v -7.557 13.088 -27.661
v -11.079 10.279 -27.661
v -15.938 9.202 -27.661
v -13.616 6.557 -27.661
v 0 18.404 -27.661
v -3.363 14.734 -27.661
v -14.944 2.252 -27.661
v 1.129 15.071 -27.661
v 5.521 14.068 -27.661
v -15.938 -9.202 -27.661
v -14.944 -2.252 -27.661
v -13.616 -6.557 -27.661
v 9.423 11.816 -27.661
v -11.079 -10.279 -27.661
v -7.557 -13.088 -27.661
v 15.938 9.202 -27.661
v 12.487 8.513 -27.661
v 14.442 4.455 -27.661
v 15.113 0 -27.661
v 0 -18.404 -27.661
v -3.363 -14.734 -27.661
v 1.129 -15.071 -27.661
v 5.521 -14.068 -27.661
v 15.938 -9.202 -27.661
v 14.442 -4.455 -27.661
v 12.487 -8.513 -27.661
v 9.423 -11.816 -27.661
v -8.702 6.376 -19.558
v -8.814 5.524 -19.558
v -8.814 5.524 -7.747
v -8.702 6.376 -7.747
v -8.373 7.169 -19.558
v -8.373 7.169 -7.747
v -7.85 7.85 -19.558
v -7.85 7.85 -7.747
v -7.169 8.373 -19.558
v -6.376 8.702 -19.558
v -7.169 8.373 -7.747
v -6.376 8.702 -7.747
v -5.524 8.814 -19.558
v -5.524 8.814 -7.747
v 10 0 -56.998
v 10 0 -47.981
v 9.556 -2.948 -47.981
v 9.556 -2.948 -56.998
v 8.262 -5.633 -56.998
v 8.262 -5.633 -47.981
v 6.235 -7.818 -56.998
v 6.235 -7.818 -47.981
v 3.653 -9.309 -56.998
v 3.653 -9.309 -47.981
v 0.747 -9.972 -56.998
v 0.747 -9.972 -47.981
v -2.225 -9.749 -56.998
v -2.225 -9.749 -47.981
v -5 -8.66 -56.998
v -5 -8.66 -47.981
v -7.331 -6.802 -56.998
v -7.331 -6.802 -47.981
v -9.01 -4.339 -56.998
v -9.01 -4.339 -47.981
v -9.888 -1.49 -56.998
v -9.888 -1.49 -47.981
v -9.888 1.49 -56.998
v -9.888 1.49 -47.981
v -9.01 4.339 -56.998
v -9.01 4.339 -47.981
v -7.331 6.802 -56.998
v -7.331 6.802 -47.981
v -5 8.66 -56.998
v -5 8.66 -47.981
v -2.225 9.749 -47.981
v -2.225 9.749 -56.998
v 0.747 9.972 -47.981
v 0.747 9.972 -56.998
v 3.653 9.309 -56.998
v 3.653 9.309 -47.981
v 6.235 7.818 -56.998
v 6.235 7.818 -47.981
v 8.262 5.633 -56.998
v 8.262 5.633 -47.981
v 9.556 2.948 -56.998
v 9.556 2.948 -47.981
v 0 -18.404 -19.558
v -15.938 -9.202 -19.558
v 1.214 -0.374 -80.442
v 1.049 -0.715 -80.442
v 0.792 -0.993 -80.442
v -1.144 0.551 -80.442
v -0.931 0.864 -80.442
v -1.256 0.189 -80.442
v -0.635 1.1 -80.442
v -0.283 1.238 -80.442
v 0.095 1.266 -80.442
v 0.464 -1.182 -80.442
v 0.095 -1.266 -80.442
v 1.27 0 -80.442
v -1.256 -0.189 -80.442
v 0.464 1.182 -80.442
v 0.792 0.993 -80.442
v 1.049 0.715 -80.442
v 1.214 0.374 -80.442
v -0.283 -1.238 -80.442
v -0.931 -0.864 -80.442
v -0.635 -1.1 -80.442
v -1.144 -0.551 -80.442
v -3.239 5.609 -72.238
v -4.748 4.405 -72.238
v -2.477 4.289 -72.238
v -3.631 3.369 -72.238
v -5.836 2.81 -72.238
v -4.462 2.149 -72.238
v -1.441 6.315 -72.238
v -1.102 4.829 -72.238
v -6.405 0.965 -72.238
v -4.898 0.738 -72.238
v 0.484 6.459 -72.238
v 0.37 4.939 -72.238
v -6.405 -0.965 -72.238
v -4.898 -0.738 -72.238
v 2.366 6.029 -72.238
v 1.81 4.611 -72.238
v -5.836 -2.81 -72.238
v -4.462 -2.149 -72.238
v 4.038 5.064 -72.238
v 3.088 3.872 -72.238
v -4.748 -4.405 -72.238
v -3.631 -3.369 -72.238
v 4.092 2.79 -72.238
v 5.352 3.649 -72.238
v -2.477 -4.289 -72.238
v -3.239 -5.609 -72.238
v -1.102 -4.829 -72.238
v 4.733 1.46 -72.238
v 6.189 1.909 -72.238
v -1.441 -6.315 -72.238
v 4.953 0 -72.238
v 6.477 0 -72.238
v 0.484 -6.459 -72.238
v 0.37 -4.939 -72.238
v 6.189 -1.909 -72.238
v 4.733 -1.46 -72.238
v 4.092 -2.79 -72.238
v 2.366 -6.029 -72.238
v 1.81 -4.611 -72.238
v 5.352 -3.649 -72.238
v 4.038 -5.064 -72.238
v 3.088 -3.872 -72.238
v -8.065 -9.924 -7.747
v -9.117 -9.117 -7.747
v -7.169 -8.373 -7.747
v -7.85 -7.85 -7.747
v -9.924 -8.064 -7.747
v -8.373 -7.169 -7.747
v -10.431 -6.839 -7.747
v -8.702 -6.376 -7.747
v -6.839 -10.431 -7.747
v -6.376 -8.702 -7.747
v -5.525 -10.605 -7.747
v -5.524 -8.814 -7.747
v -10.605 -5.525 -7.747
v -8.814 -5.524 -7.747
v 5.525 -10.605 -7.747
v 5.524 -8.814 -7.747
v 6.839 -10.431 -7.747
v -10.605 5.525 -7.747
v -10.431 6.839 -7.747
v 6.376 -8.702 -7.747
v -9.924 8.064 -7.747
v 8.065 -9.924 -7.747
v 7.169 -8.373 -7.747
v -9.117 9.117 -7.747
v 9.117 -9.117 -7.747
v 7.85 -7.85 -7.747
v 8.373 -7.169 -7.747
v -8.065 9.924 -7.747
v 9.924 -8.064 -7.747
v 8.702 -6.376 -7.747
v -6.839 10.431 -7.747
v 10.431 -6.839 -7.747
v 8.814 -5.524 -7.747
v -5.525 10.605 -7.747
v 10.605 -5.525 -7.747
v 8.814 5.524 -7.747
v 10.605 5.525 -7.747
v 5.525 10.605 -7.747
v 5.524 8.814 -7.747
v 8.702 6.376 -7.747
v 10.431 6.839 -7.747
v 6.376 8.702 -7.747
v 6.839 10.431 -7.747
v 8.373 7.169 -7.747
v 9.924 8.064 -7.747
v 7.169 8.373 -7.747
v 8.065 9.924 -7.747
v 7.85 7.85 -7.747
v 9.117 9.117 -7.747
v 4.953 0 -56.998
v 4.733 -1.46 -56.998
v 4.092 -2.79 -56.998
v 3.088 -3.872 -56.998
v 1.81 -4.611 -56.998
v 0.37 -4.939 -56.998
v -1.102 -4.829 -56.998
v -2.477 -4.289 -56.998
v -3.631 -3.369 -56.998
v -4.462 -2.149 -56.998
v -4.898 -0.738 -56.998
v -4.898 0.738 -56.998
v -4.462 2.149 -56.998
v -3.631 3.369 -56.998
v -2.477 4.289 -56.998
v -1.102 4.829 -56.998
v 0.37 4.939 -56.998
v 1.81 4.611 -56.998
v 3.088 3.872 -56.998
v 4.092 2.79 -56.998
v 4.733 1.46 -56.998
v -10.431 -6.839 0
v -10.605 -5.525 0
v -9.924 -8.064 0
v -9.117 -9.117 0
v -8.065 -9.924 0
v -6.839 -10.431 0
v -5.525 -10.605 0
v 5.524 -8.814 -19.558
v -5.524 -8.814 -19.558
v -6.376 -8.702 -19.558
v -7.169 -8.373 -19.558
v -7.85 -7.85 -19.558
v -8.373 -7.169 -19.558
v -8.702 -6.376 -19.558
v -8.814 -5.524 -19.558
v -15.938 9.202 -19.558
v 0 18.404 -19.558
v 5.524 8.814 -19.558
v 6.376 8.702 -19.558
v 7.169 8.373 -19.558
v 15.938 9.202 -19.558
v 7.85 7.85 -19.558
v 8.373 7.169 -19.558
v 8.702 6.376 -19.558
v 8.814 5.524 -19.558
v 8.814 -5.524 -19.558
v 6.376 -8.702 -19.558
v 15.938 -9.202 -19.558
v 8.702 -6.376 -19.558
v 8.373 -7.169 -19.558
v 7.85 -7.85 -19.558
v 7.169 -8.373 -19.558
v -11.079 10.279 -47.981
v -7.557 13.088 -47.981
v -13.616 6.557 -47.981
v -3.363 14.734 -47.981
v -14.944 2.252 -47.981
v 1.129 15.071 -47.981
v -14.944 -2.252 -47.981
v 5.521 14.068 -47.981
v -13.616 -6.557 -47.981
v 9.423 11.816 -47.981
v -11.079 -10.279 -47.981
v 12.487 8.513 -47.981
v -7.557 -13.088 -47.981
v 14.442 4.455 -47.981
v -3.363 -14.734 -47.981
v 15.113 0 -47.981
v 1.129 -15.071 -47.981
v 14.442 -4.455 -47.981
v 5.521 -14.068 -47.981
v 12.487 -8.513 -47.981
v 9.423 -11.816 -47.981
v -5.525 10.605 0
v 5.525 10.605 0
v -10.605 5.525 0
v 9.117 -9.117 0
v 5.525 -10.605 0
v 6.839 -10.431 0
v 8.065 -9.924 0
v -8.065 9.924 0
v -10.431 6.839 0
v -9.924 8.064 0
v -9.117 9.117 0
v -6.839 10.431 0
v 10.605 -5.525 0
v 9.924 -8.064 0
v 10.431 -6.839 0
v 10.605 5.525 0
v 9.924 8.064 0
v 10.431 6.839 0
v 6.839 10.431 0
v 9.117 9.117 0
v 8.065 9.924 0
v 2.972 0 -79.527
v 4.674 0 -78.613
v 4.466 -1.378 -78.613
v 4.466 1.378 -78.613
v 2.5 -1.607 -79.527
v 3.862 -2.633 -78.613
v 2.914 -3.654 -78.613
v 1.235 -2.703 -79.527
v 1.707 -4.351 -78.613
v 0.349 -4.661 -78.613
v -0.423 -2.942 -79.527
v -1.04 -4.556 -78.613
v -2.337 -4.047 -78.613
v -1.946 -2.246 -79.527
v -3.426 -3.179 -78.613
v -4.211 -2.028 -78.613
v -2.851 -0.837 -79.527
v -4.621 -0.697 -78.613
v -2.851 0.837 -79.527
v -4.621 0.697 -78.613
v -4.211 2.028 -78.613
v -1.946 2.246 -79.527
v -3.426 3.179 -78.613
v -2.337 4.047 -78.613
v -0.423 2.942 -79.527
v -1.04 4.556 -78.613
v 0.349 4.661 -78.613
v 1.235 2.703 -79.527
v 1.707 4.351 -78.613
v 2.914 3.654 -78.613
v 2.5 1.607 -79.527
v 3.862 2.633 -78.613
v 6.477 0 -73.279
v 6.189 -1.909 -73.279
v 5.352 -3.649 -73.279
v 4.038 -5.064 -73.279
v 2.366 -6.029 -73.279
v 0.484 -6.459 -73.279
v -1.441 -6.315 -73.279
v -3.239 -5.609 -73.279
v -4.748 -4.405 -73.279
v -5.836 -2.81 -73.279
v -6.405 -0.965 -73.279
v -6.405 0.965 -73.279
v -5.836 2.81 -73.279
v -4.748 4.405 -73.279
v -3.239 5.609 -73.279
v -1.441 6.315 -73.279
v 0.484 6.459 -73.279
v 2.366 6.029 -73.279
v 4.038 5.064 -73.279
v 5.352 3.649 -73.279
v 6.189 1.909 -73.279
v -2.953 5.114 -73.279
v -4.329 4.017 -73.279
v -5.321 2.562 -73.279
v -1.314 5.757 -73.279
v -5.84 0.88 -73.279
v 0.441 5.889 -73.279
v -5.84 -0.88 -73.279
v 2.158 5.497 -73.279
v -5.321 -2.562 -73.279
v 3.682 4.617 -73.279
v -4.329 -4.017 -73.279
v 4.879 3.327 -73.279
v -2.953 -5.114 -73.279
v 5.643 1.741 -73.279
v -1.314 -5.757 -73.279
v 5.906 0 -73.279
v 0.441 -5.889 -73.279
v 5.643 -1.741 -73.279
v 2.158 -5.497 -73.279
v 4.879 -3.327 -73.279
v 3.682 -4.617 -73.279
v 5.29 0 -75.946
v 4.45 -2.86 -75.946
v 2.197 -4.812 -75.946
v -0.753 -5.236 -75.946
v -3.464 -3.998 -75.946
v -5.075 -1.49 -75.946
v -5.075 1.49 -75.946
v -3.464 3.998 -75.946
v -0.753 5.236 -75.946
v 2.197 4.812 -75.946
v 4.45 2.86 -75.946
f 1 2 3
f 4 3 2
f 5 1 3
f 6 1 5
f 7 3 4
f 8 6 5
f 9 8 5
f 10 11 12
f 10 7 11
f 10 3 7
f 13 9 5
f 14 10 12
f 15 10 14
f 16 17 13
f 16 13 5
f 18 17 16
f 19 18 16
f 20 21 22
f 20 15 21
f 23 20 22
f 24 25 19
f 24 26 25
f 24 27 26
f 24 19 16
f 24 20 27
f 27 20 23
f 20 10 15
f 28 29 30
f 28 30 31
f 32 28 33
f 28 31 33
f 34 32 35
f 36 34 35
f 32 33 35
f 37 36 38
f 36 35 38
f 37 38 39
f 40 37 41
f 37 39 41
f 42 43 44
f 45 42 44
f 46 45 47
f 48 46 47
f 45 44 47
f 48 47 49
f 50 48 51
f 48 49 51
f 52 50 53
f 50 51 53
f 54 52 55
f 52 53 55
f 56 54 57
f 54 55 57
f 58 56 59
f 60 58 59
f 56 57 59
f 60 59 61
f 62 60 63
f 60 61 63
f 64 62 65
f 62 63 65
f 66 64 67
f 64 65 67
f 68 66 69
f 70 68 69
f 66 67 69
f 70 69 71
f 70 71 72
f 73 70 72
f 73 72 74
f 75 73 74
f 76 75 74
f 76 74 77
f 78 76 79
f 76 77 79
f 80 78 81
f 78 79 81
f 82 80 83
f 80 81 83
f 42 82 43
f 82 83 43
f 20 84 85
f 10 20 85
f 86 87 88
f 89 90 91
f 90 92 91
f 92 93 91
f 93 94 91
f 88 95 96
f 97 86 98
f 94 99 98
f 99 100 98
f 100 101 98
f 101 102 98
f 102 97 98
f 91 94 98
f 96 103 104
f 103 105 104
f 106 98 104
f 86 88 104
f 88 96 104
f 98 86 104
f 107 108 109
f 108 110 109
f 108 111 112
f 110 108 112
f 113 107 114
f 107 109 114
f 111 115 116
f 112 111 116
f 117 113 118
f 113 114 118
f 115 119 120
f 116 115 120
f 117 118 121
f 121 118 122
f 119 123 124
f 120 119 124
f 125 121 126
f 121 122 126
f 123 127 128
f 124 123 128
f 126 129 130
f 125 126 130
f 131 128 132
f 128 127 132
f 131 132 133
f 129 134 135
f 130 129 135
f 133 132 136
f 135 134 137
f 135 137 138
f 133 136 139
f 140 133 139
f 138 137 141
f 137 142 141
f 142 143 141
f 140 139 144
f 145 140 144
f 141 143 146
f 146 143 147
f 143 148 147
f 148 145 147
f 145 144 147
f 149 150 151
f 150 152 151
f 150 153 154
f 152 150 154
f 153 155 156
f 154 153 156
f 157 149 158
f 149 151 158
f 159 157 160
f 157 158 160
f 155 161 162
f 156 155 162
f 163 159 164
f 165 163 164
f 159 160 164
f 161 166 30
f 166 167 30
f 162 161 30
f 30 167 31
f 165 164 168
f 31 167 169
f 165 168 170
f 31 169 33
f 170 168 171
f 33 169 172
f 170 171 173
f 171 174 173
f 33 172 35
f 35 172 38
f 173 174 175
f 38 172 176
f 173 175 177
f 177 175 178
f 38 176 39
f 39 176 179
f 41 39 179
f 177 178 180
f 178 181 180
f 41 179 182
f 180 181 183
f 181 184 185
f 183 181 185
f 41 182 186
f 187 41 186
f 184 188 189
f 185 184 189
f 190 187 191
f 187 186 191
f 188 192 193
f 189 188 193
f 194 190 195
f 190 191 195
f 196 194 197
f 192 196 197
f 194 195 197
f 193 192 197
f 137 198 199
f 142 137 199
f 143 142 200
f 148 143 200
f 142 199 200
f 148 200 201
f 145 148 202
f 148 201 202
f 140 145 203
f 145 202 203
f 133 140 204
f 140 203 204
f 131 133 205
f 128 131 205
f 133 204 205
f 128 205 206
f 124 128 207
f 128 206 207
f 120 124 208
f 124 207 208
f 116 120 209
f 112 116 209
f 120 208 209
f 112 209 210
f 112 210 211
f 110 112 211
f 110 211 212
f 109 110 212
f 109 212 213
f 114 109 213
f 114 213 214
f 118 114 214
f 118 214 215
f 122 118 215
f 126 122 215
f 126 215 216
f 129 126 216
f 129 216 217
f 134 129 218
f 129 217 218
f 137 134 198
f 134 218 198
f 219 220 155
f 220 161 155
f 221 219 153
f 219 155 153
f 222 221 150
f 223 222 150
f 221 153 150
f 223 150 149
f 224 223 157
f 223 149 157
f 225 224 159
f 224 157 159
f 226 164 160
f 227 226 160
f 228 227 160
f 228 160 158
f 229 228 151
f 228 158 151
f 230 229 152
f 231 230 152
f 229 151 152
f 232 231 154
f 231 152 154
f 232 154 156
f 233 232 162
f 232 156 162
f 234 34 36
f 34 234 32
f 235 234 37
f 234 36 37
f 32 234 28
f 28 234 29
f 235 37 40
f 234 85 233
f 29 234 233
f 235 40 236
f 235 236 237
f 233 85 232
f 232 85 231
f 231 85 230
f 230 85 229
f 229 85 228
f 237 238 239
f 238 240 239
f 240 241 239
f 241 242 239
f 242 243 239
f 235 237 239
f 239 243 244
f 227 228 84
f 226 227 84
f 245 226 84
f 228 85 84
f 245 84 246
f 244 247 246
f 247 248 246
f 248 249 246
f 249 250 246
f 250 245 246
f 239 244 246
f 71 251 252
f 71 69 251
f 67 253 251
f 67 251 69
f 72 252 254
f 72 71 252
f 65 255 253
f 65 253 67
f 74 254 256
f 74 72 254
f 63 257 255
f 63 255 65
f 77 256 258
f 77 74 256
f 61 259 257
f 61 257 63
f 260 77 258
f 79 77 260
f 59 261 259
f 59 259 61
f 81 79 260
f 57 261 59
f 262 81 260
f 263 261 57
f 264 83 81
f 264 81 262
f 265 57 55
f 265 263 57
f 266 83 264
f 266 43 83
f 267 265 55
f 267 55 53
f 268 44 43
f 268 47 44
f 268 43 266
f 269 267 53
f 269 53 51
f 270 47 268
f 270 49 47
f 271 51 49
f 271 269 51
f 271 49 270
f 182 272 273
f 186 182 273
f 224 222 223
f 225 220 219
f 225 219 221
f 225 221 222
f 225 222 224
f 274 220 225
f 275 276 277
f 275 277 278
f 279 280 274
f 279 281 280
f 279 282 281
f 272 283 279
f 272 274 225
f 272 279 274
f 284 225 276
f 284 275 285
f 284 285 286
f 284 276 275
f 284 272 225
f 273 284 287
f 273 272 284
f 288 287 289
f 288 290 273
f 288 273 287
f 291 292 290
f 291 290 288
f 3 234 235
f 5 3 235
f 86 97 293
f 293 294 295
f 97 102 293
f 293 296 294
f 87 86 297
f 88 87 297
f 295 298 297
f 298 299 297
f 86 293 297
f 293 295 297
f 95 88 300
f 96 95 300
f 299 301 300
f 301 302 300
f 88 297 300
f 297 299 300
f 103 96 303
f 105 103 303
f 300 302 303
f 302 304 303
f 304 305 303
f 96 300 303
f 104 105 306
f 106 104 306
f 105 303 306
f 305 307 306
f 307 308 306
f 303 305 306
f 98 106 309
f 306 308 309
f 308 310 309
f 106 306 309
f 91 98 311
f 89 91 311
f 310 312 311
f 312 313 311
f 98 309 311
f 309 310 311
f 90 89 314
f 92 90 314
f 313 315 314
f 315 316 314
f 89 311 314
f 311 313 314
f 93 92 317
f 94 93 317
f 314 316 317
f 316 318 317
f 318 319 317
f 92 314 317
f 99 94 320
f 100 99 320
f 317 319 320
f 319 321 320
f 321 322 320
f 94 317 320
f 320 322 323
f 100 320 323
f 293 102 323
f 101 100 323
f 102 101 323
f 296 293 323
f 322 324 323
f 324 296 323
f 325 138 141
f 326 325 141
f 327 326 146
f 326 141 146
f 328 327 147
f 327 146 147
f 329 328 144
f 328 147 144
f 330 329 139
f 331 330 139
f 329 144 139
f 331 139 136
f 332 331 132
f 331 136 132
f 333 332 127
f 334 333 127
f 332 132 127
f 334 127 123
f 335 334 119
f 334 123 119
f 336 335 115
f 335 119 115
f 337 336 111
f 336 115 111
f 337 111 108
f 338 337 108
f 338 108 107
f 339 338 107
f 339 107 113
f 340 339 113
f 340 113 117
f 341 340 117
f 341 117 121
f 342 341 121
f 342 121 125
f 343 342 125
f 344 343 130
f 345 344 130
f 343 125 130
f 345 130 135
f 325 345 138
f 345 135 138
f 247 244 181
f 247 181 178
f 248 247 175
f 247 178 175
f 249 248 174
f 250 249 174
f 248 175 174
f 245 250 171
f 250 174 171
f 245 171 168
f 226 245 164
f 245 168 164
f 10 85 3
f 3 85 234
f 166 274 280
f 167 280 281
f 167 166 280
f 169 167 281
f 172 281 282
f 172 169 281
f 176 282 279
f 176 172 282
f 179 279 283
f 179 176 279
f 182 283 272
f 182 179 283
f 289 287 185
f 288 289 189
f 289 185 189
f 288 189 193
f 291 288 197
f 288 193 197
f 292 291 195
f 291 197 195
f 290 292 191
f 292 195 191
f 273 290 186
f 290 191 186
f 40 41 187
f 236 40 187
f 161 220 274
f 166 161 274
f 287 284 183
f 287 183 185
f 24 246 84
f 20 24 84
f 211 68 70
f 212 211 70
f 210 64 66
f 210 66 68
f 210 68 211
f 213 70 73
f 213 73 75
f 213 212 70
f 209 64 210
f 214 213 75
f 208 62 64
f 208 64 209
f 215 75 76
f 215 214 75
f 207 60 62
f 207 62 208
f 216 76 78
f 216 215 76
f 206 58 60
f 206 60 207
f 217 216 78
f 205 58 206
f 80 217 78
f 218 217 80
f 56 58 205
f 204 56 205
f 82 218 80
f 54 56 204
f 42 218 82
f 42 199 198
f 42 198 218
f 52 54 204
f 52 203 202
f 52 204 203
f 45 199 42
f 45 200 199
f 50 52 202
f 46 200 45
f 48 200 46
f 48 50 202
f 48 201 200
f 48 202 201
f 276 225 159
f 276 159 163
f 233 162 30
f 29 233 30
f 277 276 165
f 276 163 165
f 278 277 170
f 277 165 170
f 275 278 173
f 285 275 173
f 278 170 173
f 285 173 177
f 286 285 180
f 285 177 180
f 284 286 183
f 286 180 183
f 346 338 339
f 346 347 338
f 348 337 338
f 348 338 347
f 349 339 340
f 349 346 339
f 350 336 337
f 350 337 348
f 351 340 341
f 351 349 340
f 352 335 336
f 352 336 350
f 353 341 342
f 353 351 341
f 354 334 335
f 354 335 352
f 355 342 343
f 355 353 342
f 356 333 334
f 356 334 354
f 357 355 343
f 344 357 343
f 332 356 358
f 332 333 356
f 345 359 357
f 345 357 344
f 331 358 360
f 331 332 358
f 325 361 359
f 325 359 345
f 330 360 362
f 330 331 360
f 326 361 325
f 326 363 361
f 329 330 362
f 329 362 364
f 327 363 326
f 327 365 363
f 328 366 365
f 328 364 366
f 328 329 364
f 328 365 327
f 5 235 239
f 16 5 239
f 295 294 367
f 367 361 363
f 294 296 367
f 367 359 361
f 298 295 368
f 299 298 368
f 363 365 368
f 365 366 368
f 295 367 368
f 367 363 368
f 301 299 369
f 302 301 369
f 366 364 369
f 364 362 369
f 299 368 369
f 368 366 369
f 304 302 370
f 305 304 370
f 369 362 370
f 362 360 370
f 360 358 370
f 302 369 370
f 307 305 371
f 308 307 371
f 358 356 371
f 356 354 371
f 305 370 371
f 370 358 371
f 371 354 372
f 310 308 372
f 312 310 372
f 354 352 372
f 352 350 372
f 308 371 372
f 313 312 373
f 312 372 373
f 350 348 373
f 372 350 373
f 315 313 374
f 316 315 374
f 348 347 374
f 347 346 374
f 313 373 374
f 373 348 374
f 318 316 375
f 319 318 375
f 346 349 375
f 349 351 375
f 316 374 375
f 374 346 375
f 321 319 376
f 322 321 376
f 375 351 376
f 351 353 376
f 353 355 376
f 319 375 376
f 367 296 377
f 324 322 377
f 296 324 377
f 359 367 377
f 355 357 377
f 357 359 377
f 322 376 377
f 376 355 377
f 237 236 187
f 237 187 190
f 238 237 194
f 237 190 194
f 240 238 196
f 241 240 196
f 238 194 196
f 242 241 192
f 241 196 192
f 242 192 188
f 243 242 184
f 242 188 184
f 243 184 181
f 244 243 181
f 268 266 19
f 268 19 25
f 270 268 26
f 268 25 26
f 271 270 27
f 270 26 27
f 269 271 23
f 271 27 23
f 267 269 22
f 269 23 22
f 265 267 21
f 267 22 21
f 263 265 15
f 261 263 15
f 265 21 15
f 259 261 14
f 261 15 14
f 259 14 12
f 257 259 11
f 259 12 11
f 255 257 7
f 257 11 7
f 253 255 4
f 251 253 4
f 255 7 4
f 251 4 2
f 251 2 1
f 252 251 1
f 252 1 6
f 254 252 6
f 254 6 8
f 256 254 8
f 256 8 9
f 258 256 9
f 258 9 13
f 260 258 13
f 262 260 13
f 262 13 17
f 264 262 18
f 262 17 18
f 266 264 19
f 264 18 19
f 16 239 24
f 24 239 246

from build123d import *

# Parameters (mm, degrees)
F0_W      = 21.209
F0_H      = 21.209
F1_DEPTH  = 7.747
F2_R      = 5.08
F4_DEPTH  = 11.811
F6_DEPTH  = 8.1026
F7_R      = 15.113
F8_DEPTH  = 20.32
F9_R      = 10
F10_DEPTH = 9.017
F11_R     = 4.953
F12_DEPTH = 15.24
F13_R     = 6.477
F14_DEPTH = 1.0414


with BuildPart() as f1:
    # F0 (on Top) → F1 (new body)
    with BuildSketch(Plane.XY):
        Rectangle(F0_W, F0_H)
    extrude(amount=-F1_DEPTH)

    # F2
    f2_edges = [f1.edges().sort_by_distance(p)[0] for p in [
        (10.6045, -10.6045, -3.8735),
        (-10.6045, -10.6045, -3.8735),
        (-10.6045, 10.6045, -3.8735),
        (10.6045, 10.6045, -3.8735),
    ]]
    fillet(f2_edges, radius=F2_R)

    # F3 (on face) → F4 (join)
    with BuildSketch(Plane(origin=(0, 0, -7.747), x_dir=(1, 0, 0), z_dir=(0, 0, -1))):
        with BuildLine():
            Line((8.8138, -5.5245), (8.8138, 5.5245))
            ThreePointArc((8.8138, 5.5245), (7.850386, 7.850386), (5.5245, 8.8138))
            Line((5.5245, 8.8138), (-5.5245, 8.8138))
            ThreePointArc((-5.5245, 8.8138), (-7.850386, 7.850386), (-8.8138, 5.5245))
            Line((-8.8138, 5.5245), (-8.8138, -5.5245))
            ThreePointArc((-8.8138, -5.5245), (-7.850386, -7.850386), (-5.5245, -8.8138))
            Line((-5.5245, -8.8138), (5.5245, -8.8138))
            ThreePointArc((5.5245, -8.8138), (7.850386, -7.850386), (8.8138, -5.5245))
        make_face()
    extrude(amount=F4_DEPTH)

    # F5 (on face) → F6 (join)
    with BuildSketch(Plane(origin=(0, 0, -19.558), x_dir=(1, 0, 0), z_dir=(0, 0, -1))):
        Polygon((15.9385, -9.202097), (15.9385, 9.202097), (0, 18.404195), (-15.9385, 9.202097), (-15.9385, -9.202097), (0, -18.404195), align=None)
    extrude(amount=F6_DEPTH)

    # F7 (on face) → F8 (join)
    with BuildSketch(Plane(origin=(0, 0, -27.6606), x_dir=(1, 0, 0), z_dir=(0, 0, -1))):
        Circle(F7_R)
    extrude(amount=F8_DEPTH)

    # F9 (on face) → F10 (join)
    with BuildSketch(Plane(origin=(0, 0, -47.9806), x_dir=(1, 0, 0), z_dir=(0, 0, -1))):
        Circle(F9_R)
    extrude(amount=F10_DEPTH)

    # F11 (on face) → F12 (join)
    with BuildSketch(Plane(origin=(0, 0, -56.9976), x_dir=(1, 0, 0), z_dir=(0, 0, -1))):
        Circle(F11_R)
    extrude(amount=F12_DEPTH)

    # F13 (on face) → F14 (join)
    with BuildSketch(Plane(origin=(0, 0, -72.2376), x_dir=(1, 0, 0), z_dir=(0, 0, -1))):
        Circle(F13_R)
    extrude(amount=F14_DEPTH)

    # F15 (on Front) → F16 (revolve)
    with BuildSketch(Plane.XZ):
        Polygon((5.9055, -73.279), (0, -73.279), (0, -80.4418), (1.27, -80.4418), (4.6736, -78.613), align=None)
    revolve(axis=Axis((0, 0, -76.8604), (0, 0, -1)))


solid = f1.part
